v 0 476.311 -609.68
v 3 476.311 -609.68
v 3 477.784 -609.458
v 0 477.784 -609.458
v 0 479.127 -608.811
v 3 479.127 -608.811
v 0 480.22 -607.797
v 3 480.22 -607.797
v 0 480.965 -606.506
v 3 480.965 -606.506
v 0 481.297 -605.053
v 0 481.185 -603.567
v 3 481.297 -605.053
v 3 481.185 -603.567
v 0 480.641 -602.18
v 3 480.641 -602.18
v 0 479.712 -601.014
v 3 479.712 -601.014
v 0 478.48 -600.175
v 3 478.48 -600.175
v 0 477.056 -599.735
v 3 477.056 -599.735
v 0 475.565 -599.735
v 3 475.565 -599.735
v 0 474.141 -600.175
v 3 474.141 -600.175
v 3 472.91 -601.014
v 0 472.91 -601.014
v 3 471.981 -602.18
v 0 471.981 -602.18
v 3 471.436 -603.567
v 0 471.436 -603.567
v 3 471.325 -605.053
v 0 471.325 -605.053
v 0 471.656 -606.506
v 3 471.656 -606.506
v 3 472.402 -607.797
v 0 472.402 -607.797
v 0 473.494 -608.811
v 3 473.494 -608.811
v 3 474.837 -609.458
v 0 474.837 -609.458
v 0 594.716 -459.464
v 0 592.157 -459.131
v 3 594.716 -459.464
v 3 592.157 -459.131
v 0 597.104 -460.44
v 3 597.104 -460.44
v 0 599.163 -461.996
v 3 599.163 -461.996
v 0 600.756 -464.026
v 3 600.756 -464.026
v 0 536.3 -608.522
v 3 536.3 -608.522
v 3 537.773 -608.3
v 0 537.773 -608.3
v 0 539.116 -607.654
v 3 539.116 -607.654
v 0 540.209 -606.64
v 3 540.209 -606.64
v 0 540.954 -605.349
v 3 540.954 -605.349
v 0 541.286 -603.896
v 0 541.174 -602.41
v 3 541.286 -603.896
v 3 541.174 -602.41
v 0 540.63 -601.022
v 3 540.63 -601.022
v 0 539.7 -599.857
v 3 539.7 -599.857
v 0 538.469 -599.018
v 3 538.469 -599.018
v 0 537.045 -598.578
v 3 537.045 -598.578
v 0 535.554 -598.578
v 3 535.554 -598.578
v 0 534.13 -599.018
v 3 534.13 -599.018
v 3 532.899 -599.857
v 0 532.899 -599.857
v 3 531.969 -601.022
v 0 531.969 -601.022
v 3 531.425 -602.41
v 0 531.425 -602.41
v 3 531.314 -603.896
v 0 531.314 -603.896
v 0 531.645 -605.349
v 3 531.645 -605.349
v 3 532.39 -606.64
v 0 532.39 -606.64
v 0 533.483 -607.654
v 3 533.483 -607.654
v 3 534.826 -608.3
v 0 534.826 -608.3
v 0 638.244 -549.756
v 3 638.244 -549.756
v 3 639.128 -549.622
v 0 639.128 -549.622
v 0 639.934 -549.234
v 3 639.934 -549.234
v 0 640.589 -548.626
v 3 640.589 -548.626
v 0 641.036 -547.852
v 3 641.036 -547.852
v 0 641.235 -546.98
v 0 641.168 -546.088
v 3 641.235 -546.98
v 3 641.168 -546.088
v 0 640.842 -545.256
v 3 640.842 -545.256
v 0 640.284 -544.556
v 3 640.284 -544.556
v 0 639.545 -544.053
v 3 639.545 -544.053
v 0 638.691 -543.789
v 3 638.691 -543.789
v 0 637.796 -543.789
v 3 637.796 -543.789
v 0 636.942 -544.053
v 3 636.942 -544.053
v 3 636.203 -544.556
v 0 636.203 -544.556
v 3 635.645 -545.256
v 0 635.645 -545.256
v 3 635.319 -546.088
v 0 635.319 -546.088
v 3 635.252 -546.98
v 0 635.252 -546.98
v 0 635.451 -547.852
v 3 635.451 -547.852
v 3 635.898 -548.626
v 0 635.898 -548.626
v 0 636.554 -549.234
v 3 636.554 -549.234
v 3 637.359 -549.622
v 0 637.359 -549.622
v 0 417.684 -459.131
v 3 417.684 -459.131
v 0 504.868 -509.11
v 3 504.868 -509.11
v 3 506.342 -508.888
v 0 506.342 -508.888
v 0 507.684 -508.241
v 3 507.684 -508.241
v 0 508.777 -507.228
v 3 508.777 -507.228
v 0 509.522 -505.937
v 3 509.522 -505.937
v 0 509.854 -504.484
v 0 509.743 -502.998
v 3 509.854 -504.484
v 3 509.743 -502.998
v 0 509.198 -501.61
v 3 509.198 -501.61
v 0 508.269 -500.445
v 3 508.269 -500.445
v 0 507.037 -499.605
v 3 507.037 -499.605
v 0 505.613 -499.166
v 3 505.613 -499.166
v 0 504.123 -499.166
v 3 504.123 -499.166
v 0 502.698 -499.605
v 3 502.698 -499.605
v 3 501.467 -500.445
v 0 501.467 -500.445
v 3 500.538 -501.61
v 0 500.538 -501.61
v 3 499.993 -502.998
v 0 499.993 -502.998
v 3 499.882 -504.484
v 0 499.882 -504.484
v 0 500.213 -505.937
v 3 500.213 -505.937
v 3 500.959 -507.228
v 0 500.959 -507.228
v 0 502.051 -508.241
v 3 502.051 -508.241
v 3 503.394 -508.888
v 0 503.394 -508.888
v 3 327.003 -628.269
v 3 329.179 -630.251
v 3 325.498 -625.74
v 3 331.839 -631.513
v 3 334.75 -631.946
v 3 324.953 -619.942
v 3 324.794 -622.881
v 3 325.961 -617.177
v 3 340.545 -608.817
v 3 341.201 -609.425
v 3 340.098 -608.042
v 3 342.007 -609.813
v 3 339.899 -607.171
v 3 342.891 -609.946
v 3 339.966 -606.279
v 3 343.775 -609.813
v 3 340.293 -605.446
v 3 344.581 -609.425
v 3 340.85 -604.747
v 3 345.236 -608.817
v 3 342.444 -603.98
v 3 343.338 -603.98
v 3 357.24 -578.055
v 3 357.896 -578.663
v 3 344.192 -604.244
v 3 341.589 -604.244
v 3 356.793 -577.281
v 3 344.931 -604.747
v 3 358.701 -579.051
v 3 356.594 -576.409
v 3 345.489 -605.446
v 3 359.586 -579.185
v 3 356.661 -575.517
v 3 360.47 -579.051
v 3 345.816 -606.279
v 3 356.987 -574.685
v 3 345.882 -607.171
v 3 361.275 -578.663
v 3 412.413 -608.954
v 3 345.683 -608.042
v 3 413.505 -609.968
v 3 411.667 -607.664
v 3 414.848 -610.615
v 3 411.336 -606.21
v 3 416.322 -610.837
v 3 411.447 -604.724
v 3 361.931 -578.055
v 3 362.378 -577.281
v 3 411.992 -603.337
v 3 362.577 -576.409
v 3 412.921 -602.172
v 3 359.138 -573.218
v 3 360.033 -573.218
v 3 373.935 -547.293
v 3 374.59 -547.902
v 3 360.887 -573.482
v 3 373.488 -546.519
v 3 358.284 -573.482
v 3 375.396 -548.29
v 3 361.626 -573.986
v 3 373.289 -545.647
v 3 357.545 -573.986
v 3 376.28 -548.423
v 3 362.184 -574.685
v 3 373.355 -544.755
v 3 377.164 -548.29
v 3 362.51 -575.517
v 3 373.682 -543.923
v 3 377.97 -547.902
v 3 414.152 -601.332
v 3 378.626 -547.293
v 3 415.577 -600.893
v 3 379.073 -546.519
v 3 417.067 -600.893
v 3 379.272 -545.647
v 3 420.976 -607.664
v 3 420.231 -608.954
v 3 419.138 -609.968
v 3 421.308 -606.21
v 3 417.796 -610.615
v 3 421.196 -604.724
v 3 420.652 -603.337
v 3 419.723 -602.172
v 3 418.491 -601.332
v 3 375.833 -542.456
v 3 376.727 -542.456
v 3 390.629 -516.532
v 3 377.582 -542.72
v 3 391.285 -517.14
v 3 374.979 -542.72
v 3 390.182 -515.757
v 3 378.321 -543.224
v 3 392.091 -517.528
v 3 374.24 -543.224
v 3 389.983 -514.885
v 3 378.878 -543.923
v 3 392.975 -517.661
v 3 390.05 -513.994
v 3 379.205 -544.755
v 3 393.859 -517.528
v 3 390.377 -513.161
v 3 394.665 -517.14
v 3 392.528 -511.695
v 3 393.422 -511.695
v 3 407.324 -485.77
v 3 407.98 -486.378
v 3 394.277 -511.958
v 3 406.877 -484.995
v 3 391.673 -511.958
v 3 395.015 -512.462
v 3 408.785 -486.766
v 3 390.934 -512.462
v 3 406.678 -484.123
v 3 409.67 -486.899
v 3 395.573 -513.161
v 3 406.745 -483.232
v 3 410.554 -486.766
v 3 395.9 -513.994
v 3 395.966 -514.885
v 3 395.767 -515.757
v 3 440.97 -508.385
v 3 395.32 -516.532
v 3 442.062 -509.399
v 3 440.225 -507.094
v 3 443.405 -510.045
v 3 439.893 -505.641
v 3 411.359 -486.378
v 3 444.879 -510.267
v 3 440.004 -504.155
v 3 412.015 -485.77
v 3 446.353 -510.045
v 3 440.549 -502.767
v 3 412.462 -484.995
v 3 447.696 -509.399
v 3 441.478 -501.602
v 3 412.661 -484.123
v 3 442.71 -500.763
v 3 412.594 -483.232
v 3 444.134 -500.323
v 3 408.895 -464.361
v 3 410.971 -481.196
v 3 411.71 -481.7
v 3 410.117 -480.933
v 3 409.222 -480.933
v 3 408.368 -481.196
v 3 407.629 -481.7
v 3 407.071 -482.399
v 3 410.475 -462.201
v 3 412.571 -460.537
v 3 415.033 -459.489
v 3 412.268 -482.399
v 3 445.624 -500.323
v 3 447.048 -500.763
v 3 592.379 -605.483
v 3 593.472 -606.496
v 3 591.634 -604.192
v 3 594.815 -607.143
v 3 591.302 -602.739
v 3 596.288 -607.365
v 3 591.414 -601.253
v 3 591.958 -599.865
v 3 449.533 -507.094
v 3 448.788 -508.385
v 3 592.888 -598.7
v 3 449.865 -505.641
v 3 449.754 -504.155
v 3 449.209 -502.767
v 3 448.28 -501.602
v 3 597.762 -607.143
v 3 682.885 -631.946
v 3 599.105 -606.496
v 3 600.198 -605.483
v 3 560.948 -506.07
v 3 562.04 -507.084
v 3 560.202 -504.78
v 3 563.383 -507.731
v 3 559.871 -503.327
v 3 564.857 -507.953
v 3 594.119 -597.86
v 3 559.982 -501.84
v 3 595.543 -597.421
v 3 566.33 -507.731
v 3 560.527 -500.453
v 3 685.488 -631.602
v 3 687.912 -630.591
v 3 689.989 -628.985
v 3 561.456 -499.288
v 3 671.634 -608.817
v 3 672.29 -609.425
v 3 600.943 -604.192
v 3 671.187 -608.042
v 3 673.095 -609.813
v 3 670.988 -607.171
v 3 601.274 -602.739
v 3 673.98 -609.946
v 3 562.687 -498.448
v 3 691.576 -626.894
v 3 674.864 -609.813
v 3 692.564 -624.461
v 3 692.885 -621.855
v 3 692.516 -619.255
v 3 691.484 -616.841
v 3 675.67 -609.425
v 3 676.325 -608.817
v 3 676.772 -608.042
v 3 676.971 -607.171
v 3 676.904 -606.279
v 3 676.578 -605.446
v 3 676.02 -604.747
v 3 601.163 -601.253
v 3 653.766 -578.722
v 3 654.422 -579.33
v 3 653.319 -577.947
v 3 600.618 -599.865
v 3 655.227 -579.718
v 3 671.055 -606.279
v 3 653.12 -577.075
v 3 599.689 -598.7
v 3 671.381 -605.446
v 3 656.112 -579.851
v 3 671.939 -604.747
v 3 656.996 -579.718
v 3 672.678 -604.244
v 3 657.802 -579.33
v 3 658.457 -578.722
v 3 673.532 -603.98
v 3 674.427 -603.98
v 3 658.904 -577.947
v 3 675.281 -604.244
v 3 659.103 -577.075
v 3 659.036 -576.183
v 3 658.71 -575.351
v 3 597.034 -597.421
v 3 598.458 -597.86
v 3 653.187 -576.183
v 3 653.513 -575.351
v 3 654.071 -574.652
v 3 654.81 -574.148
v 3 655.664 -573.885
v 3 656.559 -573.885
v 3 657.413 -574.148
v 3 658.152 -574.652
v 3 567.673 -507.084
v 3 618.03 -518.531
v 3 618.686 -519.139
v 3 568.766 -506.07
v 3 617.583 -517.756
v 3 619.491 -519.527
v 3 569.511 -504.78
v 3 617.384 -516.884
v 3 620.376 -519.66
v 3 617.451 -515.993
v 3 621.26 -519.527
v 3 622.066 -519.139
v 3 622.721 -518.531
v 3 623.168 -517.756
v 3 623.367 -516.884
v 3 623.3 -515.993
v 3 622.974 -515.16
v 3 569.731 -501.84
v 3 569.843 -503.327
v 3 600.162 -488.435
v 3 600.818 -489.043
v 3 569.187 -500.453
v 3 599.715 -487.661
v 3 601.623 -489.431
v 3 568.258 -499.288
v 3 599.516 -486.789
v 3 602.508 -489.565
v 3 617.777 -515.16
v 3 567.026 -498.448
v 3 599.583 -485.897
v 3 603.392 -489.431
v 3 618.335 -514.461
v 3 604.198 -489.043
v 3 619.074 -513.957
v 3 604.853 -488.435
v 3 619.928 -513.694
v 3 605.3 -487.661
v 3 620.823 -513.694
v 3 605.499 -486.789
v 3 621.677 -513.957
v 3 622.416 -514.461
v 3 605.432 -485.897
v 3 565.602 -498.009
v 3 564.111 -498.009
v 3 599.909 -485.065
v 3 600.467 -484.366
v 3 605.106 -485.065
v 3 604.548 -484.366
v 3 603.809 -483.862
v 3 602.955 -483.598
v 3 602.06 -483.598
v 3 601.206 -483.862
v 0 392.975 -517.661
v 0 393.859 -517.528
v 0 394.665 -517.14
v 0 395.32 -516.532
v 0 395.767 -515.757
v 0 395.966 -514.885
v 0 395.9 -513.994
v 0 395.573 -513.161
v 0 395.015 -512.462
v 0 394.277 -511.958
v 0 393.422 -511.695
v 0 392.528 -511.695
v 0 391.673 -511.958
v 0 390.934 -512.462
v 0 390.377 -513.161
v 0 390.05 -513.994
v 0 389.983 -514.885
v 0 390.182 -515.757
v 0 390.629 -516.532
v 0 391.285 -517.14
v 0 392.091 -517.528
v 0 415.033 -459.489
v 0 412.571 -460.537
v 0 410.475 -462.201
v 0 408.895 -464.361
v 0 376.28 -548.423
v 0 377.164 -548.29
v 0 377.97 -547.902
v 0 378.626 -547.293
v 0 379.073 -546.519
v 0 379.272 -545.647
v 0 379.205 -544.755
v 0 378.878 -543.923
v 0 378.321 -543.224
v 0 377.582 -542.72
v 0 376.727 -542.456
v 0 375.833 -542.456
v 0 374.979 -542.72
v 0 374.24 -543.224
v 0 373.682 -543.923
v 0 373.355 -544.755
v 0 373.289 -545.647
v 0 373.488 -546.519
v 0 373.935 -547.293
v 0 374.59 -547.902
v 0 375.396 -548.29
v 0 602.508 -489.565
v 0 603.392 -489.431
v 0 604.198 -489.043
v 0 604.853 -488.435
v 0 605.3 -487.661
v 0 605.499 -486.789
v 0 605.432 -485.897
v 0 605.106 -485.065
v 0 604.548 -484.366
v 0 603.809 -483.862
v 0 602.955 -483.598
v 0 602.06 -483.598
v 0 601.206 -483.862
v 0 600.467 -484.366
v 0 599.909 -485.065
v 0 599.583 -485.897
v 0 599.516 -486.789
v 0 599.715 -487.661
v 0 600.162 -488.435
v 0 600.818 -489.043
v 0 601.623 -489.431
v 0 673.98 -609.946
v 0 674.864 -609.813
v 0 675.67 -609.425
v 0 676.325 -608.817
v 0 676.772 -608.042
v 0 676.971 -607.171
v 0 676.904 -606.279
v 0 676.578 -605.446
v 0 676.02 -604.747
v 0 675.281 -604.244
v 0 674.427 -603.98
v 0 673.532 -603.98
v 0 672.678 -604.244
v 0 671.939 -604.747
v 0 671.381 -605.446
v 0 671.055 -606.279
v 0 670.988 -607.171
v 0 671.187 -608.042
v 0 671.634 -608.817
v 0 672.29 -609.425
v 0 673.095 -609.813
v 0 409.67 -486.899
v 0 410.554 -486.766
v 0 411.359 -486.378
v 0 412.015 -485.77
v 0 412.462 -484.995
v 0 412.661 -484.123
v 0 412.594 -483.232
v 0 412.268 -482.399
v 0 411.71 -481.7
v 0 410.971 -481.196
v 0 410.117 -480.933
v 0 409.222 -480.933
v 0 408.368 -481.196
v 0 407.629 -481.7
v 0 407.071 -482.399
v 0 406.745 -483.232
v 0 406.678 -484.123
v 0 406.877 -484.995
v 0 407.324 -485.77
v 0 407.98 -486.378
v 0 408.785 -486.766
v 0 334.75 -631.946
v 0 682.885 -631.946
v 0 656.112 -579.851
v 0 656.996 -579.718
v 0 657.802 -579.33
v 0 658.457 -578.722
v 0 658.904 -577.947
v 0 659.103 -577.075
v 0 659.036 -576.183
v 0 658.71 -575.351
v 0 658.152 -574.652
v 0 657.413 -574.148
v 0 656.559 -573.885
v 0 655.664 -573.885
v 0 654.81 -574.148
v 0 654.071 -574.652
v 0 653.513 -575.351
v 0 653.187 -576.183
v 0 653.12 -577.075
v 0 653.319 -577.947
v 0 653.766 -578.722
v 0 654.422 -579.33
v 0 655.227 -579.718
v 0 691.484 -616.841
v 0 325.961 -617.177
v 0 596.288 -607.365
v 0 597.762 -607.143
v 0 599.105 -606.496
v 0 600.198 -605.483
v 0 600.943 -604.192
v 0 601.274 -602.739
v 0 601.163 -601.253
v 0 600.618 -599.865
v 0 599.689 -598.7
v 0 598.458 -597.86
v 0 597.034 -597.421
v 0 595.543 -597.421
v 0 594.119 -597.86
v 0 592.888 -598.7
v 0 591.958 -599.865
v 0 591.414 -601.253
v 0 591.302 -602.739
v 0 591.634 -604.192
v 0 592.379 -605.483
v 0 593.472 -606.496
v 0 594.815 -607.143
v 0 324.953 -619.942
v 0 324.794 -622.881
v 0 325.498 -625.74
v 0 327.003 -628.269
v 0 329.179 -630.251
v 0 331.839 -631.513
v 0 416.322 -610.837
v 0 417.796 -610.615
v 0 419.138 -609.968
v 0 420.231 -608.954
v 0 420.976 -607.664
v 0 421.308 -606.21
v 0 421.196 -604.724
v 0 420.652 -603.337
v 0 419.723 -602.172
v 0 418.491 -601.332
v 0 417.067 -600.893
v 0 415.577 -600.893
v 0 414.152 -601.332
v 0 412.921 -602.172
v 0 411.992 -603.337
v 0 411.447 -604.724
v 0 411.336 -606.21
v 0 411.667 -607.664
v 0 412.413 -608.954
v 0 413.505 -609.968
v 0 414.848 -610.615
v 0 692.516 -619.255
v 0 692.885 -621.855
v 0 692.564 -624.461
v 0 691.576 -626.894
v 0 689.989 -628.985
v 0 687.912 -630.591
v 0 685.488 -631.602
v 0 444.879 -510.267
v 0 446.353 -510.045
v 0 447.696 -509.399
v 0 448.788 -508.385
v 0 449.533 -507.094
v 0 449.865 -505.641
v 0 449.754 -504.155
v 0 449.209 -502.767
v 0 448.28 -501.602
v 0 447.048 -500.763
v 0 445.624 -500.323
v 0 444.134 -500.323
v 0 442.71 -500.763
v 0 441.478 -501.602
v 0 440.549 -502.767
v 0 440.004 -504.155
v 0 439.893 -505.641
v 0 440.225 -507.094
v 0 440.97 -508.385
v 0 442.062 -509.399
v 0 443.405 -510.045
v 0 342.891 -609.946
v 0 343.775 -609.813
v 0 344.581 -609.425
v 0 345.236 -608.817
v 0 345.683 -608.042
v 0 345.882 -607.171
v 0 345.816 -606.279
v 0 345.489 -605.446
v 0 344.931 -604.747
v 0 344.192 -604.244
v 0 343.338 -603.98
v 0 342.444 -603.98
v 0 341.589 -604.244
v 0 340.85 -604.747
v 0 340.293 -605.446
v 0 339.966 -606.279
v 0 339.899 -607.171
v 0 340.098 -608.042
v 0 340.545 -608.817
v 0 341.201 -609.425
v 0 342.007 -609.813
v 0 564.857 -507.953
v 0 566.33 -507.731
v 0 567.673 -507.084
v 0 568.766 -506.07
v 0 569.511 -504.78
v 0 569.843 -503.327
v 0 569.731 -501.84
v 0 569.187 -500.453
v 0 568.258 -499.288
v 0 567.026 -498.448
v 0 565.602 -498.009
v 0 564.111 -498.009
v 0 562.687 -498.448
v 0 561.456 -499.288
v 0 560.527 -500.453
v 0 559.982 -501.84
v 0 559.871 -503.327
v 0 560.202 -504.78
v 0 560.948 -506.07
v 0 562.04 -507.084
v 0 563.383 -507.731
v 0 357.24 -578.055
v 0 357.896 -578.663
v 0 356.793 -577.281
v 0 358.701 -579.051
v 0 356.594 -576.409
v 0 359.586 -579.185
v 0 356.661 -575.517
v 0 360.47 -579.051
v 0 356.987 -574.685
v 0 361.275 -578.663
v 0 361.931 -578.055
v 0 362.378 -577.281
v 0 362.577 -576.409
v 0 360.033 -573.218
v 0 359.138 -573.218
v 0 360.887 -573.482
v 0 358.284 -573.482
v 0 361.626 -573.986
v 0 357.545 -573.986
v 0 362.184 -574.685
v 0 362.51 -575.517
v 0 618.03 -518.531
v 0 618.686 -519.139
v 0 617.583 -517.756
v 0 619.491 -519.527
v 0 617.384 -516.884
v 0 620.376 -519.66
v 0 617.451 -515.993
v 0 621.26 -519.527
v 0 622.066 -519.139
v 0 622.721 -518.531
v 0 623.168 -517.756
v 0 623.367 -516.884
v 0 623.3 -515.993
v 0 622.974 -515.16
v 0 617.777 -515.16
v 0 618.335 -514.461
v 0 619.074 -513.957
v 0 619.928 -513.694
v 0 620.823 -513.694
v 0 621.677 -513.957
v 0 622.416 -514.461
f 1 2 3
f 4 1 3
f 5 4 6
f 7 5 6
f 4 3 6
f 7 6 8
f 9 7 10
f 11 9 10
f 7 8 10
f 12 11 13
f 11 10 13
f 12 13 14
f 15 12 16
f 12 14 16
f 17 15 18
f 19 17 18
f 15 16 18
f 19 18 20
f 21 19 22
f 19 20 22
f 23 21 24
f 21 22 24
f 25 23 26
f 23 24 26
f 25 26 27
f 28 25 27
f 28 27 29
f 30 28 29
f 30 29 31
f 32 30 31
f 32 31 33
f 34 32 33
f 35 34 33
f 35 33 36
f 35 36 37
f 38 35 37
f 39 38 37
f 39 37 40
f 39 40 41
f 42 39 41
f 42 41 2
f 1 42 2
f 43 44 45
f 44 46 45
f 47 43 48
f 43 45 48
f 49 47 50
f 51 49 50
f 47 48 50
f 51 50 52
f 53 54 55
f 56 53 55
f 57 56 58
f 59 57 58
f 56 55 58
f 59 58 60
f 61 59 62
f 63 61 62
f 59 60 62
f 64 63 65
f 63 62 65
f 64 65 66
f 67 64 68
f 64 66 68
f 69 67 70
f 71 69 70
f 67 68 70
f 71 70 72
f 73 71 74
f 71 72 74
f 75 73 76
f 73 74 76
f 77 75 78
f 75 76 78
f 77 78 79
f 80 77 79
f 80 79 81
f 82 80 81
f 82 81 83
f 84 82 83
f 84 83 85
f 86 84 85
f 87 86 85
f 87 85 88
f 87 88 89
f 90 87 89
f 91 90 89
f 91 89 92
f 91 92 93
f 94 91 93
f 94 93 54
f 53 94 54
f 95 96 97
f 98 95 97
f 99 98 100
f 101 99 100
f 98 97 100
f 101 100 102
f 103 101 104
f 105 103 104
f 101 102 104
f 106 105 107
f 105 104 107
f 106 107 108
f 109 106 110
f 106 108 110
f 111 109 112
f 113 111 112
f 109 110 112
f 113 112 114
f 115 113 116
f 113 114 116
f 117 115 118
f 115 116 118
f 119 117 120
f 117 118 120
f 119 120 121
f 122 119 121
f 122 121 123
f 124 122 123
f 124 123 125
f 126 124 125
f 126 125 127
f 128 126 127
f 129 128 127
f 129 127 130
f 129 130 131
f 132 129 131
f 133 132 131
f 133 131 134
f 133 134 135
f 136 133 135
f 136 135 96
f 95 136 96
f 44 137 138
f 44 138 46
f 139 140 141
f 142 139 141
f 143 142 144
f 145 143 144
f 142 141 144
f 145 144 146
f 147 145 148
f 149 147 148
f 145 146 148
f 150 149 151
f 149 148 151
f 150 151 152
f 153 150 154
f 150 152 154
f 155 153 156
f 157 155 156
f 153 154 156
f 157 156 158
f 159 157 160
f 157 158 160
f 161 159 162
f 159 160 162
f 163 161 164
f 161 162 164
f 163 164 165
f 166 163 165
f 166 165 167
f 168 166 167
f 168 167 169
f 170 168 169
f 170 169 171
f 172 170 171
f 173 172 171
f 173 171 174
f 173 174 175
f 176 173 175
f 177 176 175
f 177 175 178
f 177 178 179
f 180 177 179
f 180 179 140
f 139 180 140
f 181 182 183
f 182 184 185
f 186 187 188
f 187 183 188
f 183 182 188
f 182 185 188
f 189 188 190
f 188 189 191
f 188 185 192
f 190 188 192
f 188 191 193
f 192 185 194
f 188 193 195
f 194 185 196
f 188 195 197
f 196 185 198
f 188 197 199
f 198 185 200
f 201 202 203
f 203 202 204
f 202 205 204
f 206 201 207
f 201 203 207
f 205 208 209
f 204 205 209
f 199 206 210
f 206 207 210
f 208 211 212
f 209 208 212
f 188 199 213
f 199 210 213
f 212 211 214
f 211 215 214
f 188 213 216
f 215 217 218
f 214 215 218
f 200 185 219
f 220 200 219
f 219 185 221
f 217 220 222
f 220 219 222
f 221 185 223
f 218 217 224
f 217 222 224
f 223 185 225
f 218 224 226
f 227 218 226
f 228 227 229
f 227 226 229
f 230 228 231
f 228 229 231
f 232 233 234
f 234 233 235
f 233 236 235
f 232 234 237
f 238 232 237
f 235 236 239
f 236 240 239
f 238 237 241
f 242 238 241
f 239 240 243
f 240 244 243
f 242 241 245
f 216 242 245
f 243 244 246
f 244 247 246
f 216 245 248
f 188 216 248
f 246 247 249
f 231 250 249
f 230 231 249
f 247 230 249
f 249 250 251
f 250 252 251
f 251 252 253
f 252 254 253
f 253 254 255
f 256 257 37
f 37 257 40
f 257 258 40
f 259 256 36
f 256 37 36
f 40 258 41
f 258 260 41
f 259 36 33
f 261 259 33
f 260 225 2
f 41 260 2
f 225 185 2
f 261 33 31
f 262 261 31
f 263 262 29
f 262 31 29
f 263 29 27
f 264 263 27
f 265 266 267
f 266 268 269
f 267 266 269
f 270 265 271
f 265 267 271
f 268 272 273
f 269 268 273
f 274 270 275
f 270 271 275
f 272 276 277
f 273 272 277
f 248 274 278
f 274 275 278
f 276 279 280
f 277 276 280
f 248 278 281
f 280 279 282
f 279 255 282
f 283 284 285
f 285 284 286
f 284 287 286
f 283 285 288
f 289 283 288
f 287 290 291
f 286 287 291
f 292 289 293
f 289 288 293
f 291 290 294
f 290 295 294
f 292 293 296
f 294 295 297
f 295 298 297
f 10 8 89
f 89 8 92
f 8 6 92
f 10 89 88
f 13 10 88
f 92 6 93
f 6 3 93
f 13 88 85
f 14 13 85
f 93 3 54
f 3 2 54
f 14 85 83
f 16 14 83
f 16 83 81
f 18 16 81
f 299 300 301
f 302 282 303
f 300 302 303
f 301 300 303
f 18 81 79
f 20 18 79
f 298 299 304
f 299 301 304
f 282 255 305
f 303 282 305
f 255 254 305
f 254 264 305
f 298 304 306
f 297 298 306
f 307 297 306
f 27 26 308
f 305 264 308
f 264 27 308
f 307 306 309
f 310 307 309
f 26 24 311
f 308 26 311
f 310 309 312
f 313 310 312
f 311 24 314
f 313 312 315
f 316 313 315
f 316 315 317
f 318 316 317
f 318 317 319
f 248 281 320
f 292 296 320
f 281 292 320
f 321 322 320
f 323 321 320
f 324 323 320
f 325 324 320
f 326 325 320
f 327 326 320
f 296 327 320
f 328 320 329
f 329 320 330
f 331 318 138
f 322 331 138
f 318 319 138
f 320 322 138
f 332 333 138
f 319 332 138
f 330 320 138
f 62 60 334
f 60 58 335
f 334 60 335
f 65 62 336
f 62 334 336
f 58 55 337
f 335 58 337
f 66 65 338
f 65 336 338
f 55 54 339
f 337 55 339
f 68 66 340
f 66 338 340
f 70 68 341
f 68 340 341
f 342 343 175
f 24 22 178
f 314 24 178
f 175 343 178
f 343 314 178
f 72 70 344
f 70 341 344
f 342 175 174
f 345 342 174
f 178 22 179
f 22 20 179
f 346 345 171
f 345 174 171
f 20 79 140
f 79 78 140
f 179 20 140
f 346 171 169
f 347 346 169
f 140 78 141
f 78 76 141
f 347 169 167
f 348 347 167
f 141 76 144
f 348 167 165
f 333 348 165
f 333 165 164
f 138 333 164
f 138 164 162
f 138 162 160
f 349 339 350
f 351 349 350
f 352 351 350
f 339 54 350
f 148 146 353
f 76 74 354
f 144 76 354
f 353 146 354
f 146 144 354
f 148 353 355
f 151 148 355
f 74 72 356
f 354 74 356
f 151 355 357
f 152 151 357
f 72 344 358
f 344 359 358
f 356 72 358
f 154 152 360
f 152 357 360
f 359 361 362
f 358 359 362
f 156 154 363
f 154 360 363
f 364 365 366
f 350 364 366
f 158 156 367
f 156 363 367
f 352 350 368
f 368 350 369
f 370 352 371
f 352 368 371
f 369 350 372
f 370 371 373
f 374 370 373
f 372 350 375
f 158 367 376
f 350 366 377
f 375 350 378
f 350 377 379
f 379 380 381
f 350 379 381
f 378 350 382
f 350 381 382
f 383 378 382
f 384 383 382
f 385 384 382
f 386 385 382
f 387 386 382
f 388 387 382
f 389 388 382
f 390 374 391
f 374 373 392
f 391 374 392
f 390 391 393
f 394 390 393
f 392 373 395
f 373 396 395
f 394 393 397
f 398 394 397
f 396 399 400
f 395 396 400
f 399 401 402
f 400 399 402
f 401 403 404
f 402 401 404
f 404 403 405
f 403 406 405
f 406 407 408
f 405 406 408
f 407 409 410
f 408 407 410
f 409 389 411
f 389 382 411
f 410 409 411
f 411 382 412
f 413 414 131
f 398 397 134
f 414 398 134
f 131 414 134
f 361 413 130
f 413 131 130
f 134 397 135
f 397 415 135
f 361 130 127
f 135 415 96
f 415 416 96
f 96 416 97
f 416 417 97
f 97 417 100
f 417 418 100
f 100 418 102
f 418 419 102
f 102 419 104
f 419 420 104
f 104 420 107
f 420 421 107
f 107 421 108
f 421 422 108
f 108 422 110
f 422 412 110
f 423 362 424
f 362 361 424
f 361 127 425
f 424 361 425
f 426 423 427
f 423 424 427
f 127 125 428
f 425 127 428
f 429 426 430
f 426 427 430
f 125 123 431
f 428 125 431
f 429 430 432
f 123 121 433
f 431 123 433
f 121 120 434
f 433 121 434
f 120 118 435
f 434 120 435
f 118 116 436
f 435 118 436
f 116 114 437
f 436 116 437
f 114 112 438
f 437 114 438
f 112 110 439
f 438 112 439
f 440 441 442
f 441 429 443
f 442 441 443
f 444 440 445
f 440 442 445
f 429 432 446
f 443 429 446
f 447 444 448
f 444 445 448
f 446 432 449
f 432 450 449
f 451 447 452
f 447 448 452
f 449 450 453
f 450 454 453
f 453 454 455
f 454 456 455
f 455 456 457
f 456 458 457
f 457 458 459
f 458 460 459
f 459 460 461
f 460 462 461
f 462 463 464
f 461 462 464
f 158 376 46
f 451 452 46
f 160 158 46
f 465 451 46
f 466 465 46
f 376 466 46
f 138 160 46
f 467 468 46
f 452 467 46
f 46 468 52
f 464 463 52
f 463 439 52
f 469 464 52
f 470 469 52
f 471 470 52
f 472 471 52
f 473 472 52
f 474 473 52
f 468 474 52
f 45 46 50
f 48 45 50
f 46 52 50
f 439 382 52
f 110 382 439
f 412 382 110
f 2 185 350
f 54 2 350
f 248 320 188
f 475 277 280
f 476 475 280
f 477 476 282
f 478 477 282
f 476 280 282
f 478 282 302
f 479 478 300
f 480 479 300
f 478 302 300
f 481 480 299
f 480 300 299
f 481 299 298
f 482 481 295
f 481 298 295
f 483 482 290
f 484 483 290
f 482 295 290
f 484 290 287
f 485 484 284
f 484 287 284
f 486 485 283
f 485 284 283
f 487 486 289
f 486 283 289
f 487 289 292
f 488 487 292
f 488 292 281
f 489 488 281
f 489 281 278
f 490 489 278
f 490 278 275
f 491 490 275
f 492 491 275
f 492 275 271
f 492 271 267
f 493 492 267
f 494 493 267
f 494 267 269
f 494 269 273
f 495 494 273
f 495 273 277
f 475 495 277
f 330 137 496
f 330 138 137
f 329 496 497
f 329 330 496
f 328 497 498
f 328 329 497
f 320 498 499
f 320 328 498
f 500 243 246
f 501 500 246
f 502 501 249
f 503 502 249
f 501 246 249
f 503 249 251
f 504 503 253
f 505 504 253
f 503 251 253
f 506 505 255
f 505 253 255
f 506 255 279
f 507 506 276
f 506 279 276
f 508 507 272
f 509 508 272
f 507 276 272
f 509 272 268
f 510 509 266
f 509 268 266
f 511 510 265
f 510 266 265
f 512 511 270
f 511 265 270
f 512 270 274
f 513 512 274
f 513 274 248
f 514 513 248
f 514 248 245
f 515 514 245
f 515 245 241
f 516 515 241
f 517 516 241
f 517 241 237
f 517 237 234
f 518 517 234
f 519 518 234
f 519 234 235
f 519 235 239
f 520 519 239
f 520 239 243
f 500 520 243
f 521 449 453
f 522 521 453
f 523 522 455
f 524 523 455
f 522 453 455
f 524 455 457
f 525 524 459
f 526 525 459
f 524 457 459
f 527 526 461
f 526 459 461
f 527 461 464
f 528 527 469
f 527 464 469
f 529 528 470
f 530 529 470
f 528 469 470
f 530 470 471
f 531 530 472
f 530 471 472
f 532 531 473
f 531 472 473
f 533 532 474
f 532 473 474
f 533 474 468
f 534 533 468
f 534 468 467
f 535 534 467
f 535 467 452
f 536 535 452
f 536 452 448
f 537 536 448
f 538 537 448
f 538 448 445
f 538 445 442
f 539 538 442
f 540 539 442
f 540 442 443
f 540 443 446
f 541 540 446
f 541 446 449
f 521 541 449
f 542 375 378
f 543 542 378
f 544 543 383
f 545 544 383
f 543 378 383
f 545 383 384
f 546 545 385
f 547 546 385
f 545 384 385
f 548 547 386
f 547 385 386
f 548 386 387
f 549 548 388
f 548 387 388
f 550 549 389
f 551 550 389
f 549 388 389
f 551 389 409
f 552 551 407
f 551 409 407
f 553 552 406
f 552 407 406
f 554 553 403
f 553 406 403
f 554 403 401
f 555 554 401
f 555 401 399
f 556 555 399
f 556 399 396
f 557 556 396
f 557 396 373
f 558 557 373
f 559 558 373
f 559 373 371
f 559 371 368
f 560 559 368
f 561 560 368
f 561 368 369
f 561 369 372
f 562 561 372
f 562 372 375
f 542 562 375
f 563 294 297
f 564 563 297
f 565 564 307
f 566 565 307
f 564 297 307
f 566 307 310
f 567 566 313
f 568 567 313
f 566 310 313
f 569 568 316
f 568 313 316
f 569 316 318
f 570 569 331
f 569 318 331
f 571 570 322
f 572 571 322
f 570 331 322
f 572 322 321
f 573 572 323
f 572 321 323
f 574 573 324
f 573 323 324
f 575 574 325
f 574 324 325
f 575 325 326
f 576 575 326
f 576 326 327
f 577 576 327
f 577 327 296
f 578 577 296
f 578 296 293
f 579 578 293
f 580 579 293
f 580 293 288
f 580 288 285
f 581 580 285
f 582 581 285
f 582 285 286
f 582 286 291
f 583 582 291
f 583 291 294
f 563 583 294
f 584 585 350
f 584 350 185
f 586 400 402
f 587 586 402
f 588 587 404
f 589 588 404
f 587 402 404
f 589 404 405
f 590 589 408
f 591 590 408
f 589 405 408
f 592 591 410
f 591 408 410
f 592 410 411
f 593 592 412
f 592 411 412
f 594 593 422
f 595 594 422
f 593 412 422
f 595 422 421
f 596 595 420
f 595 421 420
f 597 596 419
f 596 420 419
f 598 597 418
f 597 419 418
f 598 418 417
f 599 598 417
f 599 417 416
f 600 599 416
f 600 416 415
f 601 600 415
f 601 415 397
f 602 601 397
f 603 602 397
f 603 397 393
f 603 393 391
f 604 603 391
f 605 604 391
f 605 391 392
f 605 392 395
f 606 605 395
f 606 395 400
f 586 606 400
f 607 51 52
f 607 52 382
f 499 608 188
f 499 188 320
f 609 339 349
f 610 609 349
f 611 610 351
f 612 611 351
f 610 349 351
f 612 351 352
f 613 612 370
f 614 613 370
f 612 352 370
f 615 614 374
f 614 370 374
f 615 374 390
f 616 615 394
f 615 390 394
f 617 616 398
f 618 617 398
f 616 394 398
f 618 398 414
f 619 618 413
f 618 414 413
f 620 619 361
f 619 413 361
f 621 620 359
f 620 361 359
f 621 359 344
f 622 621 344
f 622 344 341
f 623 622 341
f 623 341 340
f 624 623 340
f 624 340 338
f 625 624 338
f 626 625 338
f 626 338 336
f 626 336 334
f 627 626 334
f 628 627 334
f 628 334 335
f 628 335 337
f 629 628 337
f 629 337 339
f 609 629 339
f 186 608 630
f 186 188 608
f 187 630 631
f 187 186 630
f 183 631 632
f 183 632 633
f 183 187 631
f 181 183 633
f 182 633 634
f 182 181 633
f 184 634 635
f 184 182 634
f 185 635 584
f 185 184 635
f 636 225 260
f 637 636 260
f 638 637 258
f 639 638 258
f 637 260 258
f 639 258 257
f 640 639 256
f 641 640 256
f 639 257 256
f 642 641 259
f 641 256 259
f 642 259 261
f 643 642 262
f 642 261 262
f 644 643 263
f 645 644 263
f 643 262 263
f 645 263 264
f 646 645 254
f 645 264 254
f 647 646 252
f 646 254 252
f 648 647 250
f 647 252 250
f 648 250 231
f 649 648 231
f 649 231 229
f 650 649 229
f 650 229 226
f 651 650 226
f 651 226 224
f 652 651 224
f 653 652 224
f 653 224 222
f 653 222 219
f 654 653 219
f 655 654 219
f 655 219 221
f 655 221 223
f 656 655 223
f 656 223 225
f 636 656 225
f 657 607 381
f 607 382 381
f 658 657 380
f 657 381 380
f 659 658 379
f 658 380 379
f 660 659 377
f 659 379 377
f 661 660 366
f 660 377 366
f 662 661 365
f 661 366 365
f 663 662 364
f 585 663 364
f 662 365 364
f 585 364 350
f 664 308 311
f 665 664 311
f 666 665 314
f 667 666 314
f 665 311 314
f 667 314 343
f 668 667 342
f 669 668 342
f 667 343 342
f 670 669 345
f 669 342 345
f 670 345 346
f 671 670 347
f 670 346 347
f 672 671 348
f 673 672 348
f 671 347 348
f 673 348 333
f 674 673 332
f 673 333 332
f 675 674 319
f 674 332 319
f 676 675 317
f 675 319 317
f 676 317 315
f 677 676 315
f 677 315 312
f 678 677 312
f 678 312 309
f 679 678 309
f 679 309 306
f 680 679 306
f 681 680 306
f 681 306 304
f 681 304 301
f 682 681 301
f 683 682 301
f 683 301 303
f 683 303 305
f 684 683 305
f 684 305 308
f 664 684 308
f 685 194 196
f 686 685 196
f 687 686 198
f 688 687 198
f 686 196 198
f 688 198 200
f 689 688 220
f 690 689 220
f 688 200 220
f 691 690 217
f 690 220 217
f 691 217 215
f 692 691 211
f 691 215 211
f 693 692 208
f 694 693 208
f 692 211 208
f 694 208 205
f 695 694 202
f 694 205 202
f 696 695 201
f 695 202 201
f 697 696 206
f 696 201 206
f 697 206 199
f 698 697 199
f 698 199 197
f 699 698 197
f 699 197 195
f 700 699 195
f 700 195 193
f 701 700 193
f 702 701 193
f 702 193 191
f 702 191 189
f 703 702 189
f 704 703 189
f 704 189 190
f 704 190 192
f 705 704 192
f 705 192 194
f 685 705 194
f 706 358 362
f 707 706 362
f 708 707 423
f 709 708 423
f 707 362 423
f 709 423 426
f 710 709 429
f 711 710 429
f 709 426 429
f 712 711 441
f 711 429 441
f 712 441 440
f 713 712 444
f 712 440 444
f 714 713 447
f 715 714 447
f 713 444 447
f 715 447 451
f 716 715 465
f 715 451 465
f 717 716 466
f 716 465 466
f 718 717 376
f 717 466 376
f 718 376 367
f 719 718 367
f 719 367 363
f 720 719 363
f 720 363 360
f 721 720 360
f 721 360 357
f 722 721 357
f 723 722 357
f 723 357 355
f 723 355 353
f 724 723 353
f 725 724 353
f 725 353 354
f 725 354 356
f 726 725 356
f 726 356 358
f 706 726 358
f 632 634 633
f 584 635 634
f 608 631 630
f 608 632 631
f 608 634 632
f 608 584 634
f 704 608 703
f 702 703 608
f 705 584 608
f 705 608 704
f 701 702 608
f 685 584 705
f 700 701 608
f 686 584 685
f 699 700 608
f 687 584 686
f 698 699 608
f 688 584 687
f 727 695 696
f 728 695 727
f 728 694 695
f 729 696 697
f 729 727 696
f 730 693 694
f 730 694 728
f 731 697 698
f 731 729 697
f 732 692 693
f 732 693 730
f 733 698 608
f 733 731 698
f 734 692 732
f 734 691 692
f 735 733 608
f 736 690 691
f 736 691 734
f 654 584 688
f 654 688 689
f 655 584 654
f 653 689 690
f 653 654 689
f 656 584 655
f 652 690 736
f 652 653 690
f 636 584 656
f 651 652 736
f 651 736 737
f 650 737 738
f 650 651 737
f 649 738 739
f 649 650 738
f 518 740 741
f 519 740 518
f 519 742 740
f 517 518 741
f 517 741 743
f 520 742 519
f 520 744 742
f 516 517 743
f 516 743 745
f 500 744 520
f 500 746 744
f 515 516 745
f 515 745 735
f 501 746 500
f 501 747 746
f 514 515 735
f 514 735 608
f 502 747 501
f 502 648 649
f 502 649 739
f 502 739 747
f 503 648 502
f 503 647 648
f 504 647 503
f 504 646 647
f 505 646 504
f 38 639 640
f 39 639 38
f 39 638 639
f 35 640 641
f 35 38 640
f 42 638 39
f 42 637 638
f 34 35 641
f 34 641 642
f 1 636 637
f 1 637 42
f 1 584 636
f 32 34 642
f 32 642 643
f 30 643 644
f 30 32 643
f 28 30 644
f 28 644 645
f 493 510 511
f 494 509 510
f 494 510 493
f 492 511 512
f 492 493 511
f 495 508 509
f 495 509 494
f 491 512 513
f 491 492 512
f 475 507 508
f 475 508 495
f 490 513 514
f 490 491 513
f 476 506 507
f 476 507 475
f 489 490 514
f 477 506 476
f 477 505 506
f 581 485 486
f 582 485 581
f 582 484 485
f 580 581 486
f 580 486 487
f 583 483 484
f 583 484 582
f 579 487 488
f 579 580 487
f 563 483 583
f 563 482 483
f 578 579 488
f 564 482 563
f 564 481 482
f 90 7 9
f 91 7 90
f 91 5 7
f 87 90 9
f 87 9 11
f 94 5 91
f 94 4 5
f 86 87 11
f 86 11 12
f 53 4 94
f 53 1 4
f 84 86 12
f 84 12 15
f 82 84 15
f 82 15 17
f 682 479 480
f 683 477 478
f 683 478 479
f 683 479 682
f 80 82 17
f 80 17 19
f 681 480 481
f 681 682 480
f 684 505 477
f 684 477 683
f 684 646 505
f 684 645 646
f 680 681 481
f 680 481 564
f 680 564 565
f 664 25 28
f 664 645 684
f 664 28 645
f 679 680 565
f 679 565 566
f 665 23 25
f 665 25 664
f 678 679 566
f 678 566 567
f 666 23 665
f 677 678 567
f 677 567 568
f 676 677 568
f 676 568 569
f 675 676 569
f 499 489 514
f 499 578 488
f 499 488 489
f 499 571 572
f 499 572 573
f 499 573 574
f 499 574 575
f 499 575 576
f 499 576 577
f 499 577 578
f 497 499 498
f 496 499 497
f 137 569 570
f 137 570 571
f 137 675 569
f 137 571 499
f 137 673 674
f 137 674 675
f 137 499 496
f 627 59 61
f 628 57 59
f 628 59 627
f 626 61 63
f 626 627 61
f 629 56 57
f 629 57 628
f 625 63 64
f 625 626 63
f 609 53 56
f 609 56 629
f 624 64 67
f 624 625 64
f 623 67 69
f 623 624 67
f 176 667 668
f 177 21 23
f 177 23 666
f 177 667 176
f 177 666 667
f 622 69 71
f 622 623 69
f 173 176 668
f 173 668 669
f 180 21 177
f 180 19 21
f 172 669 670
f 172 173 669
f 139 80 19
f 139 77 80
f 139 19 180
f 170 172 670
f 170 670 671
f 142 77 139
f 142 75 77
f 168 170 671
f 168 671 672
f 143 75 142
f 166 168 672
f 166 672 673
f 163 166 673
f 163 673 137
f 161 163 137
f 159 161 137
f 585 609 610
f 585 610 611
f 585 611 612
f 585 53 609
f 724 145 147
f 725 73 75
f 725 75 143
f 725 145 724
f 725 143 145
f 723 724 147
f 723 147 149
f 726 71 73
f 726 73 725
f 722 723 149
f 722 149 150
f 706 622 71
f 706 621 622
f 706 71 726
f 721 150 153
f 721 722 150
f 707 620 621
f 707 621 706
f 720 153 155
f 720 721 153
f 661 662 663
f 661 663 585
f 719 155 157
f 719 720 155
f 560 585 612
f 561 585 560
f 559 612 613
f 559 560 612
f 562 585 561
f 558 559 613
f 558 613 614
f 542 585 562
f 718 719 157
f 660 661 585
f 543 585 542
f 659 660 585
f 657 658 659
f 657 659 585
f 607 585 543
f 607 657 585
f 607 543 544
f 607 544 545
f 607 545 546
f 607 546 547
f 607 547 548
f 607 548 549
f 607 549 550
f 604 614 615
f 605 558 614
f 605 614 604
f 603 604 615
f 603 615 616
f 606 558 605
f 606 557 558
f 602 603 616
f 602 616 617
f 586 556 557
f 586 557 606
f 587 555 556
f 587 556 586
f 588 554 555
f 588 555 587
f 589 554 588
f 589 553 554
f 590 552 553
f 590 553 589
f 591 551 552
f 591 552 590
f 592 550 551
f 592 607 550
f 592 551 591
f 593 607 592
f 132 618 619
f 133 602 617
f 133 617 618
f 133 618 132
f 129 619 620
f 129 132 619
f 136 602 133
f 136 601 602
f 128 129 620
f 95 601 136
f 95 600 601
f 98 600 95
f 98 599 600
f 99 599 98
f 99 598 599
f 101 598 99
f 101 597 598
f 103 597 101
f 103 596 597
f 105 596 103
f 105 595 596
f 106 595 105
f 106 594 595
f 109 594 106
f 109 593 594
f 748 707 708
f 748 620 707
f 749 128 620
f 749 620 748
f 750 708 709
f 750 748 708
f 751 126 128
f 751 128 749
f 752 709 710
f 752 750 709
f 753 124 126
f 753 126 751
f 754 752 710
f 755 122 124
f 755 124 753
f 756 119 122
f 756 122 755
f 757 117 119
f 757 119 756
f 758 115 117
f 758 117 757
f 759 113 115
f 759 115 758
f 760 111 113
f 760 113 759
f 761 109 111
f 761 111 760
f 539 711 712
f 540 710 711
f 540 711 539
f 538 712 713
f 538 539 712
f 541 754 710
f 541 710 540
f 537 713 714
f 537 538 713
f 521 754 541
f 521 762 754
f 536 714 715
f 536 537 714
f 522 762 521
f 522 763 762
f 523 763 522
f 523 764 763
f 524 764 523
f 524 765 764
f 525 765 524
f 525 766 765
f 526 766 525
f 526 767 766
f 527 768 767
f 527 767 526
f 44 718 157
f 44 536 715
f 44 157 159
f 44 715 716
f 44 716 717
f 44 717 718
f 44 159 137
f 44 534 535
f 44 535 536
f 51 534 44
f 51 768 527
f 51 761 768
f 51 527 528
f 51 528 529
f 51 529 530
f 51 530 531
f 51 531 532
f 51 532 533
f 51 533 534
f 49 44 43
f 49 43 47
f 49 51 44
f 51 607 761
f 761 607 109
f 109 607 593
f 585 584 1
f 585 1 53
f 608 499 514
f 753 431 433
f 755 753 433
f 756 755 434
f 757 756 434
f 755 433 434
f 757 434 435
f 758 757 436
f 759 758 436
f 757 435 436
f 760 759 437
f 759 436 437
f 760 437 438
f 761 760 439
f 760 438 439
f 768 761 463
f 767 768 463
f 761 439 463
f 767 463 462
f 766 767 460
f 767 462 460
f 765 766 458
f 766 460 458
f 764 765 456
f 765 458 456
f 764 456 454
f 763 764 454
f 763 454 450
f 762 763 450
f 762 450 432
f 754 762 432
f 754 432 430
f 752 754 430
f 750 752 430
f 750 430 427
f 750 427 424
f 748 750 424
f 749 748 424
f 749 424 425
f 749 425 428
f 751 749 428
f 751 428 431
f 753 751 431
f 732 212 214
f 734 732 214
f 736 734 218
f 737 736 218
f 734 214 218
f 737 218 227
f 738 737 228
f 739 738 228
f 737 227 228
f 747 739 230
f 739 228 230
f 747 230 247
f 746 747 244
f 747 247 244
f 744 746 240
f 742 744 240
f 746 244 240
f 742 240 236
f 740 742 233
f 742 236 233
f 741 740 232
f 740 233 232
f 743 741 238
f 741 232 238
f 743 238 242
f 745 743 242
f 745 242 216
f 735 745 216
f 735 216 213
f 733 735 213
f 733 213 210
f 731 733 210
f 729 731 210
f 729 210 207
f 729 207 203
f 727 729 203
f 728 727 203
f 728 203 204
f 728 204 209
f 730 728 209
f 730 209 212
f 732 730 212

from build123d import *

# Parameters (mm, degrees)
BOSS_EXTRUDE1_DEPTH = 3
CUT_EXTRUDE1_REACH  = 5
SKETCH3_R           = 3
CUT_EXTRUDE2_REACH  = 5
SKETCH4_R           = 5
FILLET1_R           = 10


with BuildPart() as part:
    # Sketch1 → Boss-Extrude1 (new body)
    with BuildSketch(Plane(origin=(0, 0, 0), x_dir=(0, 0, -1), z_dir=(1, 0, 0))):
        Polygon((459.131022606, 411.733722484), (459.131022606, 597.849507888), (631.946459815, 700.452034157), (631.946459815, 317.945389168), align=None)
    extrude(amount=BOSS_EXTRUDE1_DEPTH)

    # Sketch3 → Cut-Extrude1 (cut, up to next)
    with BuildSketch(Plane(origin=(3, 0, 0), x_dir=(0, 0, -1), z_dir=(1, 0, 0)), mode=Mode.PRIVATE) as cut_extrude1_sk1:
        with Locations((516.660188982, 620.375565005)):
            Circle(SKETCH3_R)
    cut_extrude1_tool1 = extrude(cut_extrude1_sk1.sketch, amount=-CUT_EXTRUDE1_REACH, mode=Mode.PRIVATE) & part.part
    add(cut_extrude1_tool1.solids().sort_by_distance((3, 620.375565, -516.660189))[0], mode=Mode.SUBTRACT)
    # Sketch3 → Cut-Extrude1 (cut, up to next)
    with BuildSketch(Plane(origin=(3, 0, 0), x_dir=(0, 0, -1), z_dir=(1, 0, 0)), mode=Mode.PRIVATE) as cut_extrude1_sk2:
        with Locations((546.755612593, 638.243566507)):
            Circle(SKETCH3_R)
    cut_extrude1_tool2 = extrude(cut_extrude1_sk2.sketch, amount=-CUT_EXTRUDE1_REACH, mode=Mode.PRIVATE) & part.part
    add(cut_extrude1_tool2.solids().sort_by_distance((3, 638.243567, -546.755613))[0], mode=Mode.SUBTRACT)
    # Sketch3 → Cut-Extrude1 (cut, up to next)
    with BuildSketch(Plane(origin=(3, 0, 0), x_dir=(0, 0, -1), z_dir=(1, 0, 0)), mode=Mode.PRIVATE) as cut_extrude1_sk3:
        with Locations((576.851036204, 656.111568009)):
            Circle(SKETCH3_R)
    cut_extrude1_tool3 = extrude(cut_extrude1_sk3.sketch, amount=-CUT_EXTRUDE1_REACH, mode=Mode.PRIVATE) & part.part
    add(cut_extrude1_tool3.solids().sort_by_distance((3, 656.111568, -576.851036))[0], mode=Mode.SUBTRACT)
    # Sketch3 → Cut-Extrude1 (cut, up to next)
    with BuildSketch(Plane(origin=(3, 0, 0), x_dir=(0, 0, -1), z_dir=(1, 0, 0)), mode=Mode.PRIVATE) as cut_extrude1_sk4:
        with Locations((514.66108198, 392.974861297)):
            Circle(SKETCH3_R)
    cut_extrude1_tool4 = extrude(cut_extrude1_sk4.sketch, amount=-CUT_EXTRUDE1_REACH, mode=Mode.PRIVATE) & part.part
    add(cut_extrude1_tool4.solids().sort_by_distance((3, 392.974861, -514.661082))[0], mode=Mode.SUBTRACT)
    # Sketch3 → Cut-Extrude1 (cut, up to next)
    with BuildSketch(Plane(origin=(3, 0, 0), x_dir=(0, 0, -1), z_dir=(1, 0, 0)), mode=Mode.PRIVATE) as cut_extrude1_sk5:
        with Locations((545.422874592, 376.280188034)):
            Circle(SKETCH3_R)
    cut_extrude1_tool5 = extrude(cut_extrude1_sk5.sketch, amount=-CUT_EXTRUDE1_REACH, mode=Mode.PRIVATE) & part.part
    add(cut_extrude1_tool5.solids().sort_by_distance((3, 376.280188, -545.422875))[0], mode=Mode.SUBTRACT)
    # Sketch3 → Cut-Extrude1 (cut, up to next)
    with BuildSketch(Plane(origin=(3, 0, 0), x_dir=(0, 0, -1), z_dir=(1, 0, 0)), mode=Mode.PRIVATE) as cut_extrude1_sk6:
        with Locations((576.184667203, 359.585514772)):
            Circle(SKETCH3_R)
    cut_extrude1_tool6 = extrude(cut_extrude1_sk6.sketch, amount=-CUT_EXTRUDE1_REACH, mode=Mode.PRIVATE) & part.part
    add(cut_extrude1_tool6.solids().sort_by_distance((3, 359.585515, -576.184667))[0], mode=Mode.SUBTRACT)
    # Sketch3 → Cut-Extrude1 (cut, up to next)
    with BuildSketch(Plane(origin=(3, 0, 0), x_dir=(0, 0, -1), z_dir=(1, 0, 0)), mode=Mode.PRIVATE) as cut_extrude1_sk7:
        with Locations((486.564765371, 602.507563503)):
            Circle(SKETCH3_R)
    cut_extrude1_tool7 = extrude(cut_extrude1_sk7.sketch, amount=-CUT_EXTRUDE1_REACH, mode=Mode.PRIVATE) & part.part
    add(cut_extrude1_tool7.solids().sort_by_distance((3, 602.507564, -486.564765))[0], mode=Mode.SUBTRACT)
    # Sketch3 → Cut-Extrude1 (cut, up to next)
    with BuildSketch(Plane(origin=(3, 0, 0), x_dir=(0, 0, -1), z_dir=(1, 0, 0)), mode=Mode.PRIVATE) as cut_extrude1_sk8:
        with Locations((606.946459815, 673.979569511)):
            Circle(SKETCH3_R)
    cut_extrude1_tool8 = extrude(cut_extrude1_sk8.sketch, amount=-CUT_EXTRUDE1_REACH, mode=Mode.PRIVATE) & part.part
    add(cut_extrude1_tool8.solids().sort_by_distance((3, 673.97957, -606.94646))[0], mode=Mode.SUBTRACT)
    # Sketch3 → Cut-Extrude1 (cut, up to next)
    with BuildSketch(Plane(origin=(3, 0, 0), x_dir=(0, 0, -1), z_dir=(1, 0, 0)), mode=Mode.PRIVATE) as cut_extrude1_sk9:
        with Locations((483.899289369, 409.669534559)):
            Circle(SKETCH3_R)
    cut_extrude1_tool9 = extrude(cut_extrude1_sk9.sketch, amount=-CUT_EXTRUDE1_REACH, mode=Mode.PRIVATE) & part.part
    add(cut_extrude1_tool9.solids().sort_by_distance((3, 409.669535, -483.899289))[0], mode=Mode.SUBTRACT)
    # Sketch3 → Cut-Extrude1 (cut, up to next)
    with BuildSketch(Plane(origin=(3, 0, 0), x_dir=(0, 0, -1), z_dir=(1, 0, 0)), mode=Mode.PRIVATE) as cut_extrude1_sk10:
        with Locations((606.946459815, 342.89084151)):
            Circle(SKETCH3_R)
    cut_extrude1_tool10 = extrude(cut_extrude1_sk10.sketch, amount=-CUT_EXTRUDE1_REACH, mode=Mode.PRIVATE) & part.part
    add(cut_extrude1_tool10.solids().sort_by_distance((3, 342.890842, -606.94646))[0], mode=Mode.SUBTRACT)

    # Sketch4 → Cut-Extrude2 (cut, up to next)
    with BuildSketch(Plane(origin=(3, 0, 0), x_dir=(0, 0, -1), z_dir=(1, 0, 0)), mode=Mode.PRIVATE) as cut_extrude2_sk1:
        with Locations((602.36530116, 596.288363913)):
            Circle(SKETCH4_R)
    cut_extrude2_tool1 = extrude(cut_extrude2_sk1.sketch, amount=-CUT_EXTRUDE2_REACH, mode=Mode.PRIVATE) & part.part
    add(cut_extrude2_tool1.solids().sort_by_distance((3, 596.288364, -602.365301))[0], mode=Mode.SUBTRACT)
    # Sketch4 → Cut-Extrude2 (cut, up to next)
    with BuildSketch(Plane(origin=(3, 0, 0), x_dir=(0, 0, -1), z_dir=(1, 0, 0)), mode=Mode.PRIVATE) as cut_extrude2_sk2:
        with Locations((603.522472038, 536.299523655)):
            Circle(SKETCH4_R)
    cut_extrude2_tool2 = extrude(cut_extrude2_sk2.sketch, amount=-CUT_EXTRUDE2_REACH, mode=Mode.PRIVATE) & part.part
    add(cut_extrude2_tool2.solids().sort_by_distance((3, 536.299524, -603.522472))[0], mode=Mode.SUBTRACT)
    # Sketch4 → Cut-Extrude2 (cut, up to next)
    with BuildSketch(Plane(origin=(3, 0, 0), x_dir=(0, 0, -1), z_dir=(1, 0, 0)), mode=Mode.PRIVATE) as cut_extrude2_sk3:
        with Locations((604.679642916, 476.310683396)):
            Circle(SKETCH4_R)
    cut_extrude2_tool3 = extrude(cut_extrude2_sk3.sketch, amount=-CUT_EXTRUDE2_REACH, mode=Mode.PRIVATE) & part.part
    add(cut_extrude2_tool3.solids().sort_by_distance((3, 476.310683, -604.679643))[0], mode=Mode.SUBTRACT)
    # Sketch4 → Cut-Extrude2 (cut, up to next)
    with BuildSketch(Plane(origin=(3, 0, 0), x_dir=(0, 0, -1), z_dir=(1, 0, 0)), mode=Mode.PRIVATE) as cut_extrude2_sk4:
        with Locations((605.836813794, 416.321843138)):
            Circle(SKETCH4_R)
    cut_extrude2_tool4 = extrude(cut_extrude2_sk4.sketch, amount=-CUT_EXTRUDE2_REACH, mode=Mode.PRIVATE) & part.part
    add(cut_extrude2_tool4.solids().sort_by_distance((3, 416.321843, -605.836814))[0], mode=Mode.SUBTRACT)
    # Sketch4 → Cut-Extrude2 (cut, up to next)
    with BuildSketch(Plane(origin=(3, 0, 0), x_dir=(0, 0, -1), z_dir=(1, 0, 0)), mode=Mode.PRIVATE) as cut_extrude2_sk5:
        with Locations((502.953007582, 564.856704632)):
            Circle(SKETCH4_R)
    cut_extrude2_tool5 = extrude(cut_extrude2_sk5.sketch, amount=-CUT_EXTRUDE2_REACH, mode=Mode.PRIVATE) & part.part
    add(cut_extrude2_tool5.solids().sort_by_distance((3, 564.856705, -502.953008))[0], mode=Mode.SUBTRACT)
    # Sketch4 → Cut-Extrude2 (cut, up to next)
    with BuildSketch(Plane(origin=(3, 0, 0), x_dir=(0, 0, -1), z_dir=(1, 0, 0)), mode=Mode.PRIVATE) as cut_extrude2_sk6:
        with Locations((504.110178459, 504.867864374)):
            Circle(SKETCH4_R)
    cut_extrude2_tool6 = extrude(cut_extrude2_sk6.sketch, amount=-CUT_EXTRUDE2_REACH, mode=Mode.PRIVATE) & part.part
    add(cut_extrude2_tool6.solids().sort_by_distance((3, 504.867864, -504.110178))[0], mode=Mode.SUBTRACT)
    # Sketch4 → Cut-Extrude2 (cut, up to next)
    with BuildSketch(Plane(origin=(3, 0, 0), x_dir=(0, 0, -1), z_dir=(1, 0, 0)), mode=Mode.PRIVATE) as cut_extrude2_sk7:
        with Locations((505.267349337, 444.879024115)):
            Circle(SKETCH4_R)
    cut_extrude2_tool7 = extrude(cut_extrude2_sk7.sketch, amount=-CUT_EXTRUDE2_REACH, mode=Mode.PRIVATE) & part.part
    add(cut_extrude2_tool7.solids().sort_by_distance((3, 444.879024, -505.267349))[0], mode=Mode.SUBTRACT)

    # Fillet1
    fillet1_edges = [part.edges().sort_by_distance(p)[0] for p in [
        (1.5, 411.733722484, -459.131022606),
        (1.5, 597.849507888, -459.131022606),
        (1.5, 700.452034157, -631.946459815),
        (1.5, 317.945389168, -631.946459815),
    ]]
    fillet(fillet1_edges, radius=FILLET1_R)


solid = part.part
